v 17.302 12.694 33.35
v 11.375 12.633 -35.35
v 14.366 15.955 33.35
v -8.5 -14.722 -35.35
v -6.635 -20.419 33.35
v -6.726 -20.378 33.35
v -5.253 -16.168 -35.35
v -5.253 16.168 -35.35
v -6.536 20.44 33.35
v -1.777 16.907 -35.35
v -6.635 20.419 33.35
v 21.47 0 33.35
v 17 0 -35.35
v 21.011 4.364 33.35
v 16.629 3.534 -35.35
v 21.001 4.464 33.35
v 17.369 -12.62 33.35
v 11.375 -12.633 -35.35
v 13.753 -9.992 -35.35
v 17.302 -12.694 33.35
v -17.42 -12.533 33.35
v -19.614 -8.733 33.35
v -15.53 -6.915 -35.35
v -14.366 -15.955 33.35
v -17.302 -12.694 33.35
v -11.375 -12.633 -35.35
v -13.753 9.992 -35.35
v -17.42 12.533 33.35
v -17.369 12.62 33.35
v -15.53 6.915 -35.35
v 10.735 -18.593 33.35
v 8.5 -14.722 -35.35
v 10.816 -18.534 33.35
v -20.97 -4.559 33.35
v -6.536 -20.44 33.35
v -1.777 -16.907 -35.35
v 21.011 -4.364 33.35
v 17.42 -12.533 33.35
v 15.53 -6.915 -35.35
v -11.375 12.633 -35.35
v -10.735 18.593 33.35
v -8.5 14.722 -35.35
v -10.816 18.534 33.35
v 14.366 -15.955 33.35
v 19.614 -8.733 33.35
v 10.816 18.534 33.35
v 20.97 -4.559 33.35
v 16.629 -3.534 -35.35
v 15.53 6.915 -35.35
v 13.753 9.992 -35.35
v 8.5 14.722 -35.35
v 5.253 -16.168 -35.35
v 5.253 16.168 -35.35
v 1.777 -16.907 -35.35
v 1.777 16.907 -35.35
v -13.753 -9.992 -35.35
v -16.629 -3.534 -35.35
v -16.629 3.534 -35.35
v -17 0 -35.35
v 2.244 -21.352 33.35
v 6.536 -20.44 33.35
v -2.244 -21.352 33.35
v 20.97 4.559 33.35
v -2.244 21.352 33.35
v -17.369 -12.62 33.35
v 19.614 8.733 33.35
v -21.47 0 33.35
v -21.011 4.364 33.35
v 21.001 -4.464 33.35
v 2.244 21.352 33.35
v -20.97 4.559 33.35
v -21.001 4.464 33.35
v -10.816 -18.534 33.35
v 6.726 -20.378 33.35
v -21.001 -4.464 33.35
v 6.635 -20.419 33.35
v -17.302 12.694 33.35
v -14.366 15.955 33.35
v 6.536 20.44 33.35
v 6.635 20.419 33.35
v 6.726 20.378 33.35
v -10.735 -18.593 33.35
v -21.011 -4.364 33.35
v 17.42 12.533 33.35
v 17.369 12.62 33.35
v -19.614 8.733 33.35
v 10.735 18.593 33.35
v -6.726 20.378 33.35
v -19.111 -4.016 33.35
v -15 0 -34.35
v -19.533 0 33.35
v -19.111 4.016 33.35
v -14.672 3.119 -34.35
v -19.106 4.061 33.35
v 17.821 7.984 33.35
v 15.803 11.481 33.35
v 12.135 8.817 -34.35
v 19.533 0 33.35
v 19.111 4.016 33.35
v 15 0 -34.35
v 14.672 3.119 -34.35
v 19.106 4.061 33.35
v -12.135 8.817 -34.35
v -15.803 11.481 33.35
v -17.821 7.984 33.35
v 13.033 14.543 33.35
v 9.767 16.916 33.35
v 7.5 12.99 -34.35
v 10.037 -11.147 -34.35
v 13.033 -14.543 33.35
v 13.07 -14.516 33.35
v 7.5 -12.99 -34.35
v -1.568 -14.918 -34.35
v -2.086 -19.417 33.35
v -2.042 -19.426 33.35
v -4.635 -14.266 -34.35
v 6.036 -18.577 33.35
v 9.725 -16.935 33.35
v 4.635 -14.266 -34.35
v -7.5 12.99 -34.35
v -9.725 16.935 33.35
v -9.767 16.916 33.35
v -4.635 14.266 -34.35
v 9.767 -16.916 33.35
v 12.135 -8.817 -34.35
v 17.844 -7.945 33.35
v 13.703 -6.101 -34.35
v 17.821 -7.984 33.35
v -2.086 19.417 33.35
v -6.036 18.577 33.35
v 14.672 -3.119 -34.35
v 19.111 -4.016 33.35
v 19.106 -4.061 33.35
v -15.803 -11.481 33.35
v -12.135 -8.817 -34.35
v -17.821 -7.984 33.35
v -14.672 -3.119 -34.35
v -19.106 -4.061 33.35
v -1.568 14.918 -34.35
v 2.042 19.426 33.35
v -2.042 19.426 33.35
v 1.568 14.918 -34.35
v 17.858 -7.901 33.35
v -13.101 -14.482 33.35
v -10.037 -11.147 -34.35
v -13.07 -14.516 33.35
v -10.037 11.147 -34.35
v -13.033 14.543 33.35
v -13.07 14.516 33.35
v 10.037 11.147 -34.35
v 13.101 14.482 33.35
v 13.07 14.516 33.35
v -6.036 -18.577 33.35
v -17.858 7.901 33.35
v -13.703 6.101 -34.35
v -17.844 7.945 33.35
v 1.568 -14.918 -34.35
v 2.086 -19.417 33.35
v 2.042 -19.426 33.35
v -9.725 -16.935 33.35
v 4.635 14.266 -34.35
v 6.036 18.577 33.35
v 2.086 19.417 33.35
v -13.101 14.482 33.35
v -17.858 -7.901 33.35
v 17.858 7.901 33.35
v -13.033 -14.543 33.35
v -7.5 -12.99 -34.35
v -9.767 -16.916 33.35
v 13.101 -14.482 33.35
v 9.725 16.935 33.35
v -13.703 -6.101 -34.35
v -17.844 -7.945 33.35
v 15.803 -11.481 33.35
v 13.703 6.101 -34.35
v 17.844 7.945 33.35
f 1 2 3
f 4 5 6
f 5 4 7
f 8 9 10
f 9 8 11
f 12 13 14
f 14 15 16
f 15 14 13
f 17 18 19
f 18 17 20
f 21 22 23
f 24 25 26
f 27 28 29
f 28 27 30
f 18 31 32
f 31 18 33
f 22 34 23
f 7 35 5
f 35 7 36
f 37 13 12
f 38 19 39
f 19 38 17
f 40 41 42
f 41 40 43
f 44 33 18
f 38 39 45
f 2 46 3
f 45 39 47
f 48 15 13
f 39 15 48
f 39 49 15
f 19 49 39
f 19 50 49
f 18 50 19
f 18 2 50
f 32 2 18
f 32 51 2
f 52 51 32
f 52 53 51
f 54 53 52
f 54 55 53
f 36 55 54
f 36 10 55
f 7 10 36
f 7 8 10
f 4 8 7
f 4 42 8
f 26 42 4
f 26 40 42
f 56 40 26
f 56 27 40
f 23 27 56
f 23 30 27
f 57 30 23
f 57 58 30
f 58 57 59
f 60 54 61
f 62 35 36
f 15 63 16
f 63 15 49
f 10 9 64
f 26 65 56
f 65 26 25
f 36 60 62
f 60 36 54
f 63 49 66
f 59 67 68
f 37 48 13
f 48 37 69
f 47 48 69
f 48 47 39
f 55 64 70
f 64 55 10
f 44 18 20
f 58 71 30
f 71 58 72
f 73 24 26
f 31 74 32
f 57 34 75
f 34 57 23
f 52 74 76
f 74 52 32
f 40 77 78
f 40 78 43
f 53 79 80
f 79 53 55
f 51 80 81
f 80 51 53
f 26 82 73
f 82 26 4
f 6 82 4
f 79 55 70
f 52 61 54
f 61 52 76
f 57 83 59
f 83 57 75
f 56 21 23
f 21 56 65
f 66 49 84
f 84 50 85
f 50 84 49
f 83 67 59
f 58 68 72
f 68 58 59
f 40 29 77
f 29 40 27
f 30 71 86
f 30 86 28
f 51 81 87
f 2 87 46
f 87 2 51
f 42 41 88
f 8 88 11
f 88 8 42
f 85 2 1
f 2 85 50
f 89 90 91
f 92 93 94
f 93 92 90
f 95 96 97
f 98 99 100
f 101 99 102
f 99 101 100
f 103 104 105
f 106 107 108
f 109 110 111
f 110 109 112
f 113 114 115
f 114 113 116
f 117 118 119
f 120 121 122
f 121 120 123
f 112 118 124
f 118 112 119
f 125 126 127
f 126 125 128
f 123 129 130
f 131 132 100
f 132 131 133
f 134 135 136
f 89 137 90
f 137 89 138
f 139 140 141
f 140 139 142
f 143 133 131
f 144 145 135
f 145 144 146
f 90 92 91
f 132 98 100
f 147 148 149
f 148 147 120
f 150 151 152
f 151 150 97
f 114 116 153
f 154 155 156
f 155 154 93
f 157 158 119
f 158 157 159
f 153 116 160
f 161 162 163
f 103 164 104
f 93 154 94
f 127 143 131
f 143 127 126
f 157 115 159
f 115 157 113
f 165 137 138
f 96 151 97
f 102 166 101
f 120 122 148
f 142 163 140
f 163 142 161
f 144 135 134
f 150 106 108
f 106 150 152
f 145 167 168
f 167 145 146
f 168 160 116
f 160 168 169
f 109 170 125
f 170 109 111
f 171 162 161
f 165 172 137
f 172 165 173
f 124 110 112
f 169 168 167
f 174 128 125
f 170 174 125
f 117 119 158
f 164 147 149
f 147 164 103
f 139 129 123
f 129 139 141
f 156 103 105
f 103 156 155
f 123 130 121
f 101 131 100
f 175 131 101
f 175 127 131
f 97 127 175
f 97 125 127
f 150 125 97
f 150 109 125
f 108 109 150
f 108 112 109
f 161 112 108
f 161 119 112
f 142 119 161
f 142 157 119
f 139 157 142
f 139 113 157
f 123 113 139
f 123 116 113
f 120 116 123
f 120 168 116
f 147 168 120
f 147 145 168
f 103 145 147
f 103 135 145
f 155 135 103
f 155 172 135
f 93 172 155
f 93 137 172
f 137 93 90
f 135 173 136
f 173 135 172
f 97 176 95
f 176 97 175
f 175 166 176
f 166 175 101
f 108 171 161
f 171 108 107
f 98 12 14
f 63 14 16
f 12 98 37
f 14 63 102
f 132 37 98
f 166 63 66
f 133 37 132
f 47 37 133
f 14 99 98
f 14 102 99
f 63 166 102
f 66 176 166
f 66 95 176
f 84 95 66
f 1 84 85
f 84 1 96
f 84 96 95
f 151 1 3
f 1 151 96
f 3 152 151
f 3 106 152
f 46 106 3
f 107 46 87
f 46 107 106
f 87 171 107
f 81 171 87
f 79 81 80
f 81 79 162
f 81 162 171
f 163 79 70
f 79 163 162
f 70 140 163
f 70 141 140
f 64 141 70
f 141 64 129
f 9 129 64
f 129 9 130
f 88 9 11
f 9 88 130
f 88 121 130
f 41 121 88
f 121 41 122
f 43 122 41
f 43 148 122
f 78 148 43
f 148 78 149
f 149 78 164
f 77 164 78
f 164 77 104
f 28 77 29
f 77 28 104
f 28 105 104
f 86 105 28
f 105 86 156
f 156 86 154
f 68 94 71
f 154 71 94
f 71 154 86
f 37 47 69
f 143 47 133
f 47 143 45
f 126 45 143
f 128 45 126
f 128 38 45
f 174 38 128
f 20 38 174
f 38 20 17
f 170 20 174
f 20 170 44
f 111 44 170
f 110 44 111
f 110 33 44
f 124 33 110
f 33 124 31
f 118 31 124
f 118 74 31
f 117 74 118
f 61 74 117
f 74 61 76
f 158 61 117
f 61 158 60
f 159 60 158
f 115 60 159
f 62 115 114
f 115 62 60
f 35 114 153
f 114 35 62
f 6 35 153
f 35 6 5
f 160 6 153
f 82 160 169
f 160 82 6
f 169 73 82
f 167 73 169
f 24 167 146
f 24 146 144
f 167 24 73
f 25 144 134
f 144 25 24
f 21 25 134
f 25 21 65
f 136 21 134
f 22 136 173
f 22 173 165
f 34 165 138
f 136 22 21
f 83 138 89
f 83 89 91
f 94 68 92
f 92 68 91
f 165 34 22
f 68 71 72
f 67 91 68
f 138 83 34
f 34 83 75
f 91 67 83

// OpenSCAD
_t = 0.5;
d_a = 29.5 + _t;
r_a = d_a/2;
d_b = 38.7 + _t;
r_b = d_b/2;
h = 68.2 + _t;
w = 50;

module shot_glass(){
    cylinder(h, r_a, r_b, true);
}


module shot_glass_o(t = 2){
    difference(){
        cylinder(h+t, r_a+t, r_b+t, true);
        shot_glass();
        translate([-w/2, -w/2, h/2-t/2])
            cube([w, w, 2*t]);
        }
}

shot_glass_o();
 
